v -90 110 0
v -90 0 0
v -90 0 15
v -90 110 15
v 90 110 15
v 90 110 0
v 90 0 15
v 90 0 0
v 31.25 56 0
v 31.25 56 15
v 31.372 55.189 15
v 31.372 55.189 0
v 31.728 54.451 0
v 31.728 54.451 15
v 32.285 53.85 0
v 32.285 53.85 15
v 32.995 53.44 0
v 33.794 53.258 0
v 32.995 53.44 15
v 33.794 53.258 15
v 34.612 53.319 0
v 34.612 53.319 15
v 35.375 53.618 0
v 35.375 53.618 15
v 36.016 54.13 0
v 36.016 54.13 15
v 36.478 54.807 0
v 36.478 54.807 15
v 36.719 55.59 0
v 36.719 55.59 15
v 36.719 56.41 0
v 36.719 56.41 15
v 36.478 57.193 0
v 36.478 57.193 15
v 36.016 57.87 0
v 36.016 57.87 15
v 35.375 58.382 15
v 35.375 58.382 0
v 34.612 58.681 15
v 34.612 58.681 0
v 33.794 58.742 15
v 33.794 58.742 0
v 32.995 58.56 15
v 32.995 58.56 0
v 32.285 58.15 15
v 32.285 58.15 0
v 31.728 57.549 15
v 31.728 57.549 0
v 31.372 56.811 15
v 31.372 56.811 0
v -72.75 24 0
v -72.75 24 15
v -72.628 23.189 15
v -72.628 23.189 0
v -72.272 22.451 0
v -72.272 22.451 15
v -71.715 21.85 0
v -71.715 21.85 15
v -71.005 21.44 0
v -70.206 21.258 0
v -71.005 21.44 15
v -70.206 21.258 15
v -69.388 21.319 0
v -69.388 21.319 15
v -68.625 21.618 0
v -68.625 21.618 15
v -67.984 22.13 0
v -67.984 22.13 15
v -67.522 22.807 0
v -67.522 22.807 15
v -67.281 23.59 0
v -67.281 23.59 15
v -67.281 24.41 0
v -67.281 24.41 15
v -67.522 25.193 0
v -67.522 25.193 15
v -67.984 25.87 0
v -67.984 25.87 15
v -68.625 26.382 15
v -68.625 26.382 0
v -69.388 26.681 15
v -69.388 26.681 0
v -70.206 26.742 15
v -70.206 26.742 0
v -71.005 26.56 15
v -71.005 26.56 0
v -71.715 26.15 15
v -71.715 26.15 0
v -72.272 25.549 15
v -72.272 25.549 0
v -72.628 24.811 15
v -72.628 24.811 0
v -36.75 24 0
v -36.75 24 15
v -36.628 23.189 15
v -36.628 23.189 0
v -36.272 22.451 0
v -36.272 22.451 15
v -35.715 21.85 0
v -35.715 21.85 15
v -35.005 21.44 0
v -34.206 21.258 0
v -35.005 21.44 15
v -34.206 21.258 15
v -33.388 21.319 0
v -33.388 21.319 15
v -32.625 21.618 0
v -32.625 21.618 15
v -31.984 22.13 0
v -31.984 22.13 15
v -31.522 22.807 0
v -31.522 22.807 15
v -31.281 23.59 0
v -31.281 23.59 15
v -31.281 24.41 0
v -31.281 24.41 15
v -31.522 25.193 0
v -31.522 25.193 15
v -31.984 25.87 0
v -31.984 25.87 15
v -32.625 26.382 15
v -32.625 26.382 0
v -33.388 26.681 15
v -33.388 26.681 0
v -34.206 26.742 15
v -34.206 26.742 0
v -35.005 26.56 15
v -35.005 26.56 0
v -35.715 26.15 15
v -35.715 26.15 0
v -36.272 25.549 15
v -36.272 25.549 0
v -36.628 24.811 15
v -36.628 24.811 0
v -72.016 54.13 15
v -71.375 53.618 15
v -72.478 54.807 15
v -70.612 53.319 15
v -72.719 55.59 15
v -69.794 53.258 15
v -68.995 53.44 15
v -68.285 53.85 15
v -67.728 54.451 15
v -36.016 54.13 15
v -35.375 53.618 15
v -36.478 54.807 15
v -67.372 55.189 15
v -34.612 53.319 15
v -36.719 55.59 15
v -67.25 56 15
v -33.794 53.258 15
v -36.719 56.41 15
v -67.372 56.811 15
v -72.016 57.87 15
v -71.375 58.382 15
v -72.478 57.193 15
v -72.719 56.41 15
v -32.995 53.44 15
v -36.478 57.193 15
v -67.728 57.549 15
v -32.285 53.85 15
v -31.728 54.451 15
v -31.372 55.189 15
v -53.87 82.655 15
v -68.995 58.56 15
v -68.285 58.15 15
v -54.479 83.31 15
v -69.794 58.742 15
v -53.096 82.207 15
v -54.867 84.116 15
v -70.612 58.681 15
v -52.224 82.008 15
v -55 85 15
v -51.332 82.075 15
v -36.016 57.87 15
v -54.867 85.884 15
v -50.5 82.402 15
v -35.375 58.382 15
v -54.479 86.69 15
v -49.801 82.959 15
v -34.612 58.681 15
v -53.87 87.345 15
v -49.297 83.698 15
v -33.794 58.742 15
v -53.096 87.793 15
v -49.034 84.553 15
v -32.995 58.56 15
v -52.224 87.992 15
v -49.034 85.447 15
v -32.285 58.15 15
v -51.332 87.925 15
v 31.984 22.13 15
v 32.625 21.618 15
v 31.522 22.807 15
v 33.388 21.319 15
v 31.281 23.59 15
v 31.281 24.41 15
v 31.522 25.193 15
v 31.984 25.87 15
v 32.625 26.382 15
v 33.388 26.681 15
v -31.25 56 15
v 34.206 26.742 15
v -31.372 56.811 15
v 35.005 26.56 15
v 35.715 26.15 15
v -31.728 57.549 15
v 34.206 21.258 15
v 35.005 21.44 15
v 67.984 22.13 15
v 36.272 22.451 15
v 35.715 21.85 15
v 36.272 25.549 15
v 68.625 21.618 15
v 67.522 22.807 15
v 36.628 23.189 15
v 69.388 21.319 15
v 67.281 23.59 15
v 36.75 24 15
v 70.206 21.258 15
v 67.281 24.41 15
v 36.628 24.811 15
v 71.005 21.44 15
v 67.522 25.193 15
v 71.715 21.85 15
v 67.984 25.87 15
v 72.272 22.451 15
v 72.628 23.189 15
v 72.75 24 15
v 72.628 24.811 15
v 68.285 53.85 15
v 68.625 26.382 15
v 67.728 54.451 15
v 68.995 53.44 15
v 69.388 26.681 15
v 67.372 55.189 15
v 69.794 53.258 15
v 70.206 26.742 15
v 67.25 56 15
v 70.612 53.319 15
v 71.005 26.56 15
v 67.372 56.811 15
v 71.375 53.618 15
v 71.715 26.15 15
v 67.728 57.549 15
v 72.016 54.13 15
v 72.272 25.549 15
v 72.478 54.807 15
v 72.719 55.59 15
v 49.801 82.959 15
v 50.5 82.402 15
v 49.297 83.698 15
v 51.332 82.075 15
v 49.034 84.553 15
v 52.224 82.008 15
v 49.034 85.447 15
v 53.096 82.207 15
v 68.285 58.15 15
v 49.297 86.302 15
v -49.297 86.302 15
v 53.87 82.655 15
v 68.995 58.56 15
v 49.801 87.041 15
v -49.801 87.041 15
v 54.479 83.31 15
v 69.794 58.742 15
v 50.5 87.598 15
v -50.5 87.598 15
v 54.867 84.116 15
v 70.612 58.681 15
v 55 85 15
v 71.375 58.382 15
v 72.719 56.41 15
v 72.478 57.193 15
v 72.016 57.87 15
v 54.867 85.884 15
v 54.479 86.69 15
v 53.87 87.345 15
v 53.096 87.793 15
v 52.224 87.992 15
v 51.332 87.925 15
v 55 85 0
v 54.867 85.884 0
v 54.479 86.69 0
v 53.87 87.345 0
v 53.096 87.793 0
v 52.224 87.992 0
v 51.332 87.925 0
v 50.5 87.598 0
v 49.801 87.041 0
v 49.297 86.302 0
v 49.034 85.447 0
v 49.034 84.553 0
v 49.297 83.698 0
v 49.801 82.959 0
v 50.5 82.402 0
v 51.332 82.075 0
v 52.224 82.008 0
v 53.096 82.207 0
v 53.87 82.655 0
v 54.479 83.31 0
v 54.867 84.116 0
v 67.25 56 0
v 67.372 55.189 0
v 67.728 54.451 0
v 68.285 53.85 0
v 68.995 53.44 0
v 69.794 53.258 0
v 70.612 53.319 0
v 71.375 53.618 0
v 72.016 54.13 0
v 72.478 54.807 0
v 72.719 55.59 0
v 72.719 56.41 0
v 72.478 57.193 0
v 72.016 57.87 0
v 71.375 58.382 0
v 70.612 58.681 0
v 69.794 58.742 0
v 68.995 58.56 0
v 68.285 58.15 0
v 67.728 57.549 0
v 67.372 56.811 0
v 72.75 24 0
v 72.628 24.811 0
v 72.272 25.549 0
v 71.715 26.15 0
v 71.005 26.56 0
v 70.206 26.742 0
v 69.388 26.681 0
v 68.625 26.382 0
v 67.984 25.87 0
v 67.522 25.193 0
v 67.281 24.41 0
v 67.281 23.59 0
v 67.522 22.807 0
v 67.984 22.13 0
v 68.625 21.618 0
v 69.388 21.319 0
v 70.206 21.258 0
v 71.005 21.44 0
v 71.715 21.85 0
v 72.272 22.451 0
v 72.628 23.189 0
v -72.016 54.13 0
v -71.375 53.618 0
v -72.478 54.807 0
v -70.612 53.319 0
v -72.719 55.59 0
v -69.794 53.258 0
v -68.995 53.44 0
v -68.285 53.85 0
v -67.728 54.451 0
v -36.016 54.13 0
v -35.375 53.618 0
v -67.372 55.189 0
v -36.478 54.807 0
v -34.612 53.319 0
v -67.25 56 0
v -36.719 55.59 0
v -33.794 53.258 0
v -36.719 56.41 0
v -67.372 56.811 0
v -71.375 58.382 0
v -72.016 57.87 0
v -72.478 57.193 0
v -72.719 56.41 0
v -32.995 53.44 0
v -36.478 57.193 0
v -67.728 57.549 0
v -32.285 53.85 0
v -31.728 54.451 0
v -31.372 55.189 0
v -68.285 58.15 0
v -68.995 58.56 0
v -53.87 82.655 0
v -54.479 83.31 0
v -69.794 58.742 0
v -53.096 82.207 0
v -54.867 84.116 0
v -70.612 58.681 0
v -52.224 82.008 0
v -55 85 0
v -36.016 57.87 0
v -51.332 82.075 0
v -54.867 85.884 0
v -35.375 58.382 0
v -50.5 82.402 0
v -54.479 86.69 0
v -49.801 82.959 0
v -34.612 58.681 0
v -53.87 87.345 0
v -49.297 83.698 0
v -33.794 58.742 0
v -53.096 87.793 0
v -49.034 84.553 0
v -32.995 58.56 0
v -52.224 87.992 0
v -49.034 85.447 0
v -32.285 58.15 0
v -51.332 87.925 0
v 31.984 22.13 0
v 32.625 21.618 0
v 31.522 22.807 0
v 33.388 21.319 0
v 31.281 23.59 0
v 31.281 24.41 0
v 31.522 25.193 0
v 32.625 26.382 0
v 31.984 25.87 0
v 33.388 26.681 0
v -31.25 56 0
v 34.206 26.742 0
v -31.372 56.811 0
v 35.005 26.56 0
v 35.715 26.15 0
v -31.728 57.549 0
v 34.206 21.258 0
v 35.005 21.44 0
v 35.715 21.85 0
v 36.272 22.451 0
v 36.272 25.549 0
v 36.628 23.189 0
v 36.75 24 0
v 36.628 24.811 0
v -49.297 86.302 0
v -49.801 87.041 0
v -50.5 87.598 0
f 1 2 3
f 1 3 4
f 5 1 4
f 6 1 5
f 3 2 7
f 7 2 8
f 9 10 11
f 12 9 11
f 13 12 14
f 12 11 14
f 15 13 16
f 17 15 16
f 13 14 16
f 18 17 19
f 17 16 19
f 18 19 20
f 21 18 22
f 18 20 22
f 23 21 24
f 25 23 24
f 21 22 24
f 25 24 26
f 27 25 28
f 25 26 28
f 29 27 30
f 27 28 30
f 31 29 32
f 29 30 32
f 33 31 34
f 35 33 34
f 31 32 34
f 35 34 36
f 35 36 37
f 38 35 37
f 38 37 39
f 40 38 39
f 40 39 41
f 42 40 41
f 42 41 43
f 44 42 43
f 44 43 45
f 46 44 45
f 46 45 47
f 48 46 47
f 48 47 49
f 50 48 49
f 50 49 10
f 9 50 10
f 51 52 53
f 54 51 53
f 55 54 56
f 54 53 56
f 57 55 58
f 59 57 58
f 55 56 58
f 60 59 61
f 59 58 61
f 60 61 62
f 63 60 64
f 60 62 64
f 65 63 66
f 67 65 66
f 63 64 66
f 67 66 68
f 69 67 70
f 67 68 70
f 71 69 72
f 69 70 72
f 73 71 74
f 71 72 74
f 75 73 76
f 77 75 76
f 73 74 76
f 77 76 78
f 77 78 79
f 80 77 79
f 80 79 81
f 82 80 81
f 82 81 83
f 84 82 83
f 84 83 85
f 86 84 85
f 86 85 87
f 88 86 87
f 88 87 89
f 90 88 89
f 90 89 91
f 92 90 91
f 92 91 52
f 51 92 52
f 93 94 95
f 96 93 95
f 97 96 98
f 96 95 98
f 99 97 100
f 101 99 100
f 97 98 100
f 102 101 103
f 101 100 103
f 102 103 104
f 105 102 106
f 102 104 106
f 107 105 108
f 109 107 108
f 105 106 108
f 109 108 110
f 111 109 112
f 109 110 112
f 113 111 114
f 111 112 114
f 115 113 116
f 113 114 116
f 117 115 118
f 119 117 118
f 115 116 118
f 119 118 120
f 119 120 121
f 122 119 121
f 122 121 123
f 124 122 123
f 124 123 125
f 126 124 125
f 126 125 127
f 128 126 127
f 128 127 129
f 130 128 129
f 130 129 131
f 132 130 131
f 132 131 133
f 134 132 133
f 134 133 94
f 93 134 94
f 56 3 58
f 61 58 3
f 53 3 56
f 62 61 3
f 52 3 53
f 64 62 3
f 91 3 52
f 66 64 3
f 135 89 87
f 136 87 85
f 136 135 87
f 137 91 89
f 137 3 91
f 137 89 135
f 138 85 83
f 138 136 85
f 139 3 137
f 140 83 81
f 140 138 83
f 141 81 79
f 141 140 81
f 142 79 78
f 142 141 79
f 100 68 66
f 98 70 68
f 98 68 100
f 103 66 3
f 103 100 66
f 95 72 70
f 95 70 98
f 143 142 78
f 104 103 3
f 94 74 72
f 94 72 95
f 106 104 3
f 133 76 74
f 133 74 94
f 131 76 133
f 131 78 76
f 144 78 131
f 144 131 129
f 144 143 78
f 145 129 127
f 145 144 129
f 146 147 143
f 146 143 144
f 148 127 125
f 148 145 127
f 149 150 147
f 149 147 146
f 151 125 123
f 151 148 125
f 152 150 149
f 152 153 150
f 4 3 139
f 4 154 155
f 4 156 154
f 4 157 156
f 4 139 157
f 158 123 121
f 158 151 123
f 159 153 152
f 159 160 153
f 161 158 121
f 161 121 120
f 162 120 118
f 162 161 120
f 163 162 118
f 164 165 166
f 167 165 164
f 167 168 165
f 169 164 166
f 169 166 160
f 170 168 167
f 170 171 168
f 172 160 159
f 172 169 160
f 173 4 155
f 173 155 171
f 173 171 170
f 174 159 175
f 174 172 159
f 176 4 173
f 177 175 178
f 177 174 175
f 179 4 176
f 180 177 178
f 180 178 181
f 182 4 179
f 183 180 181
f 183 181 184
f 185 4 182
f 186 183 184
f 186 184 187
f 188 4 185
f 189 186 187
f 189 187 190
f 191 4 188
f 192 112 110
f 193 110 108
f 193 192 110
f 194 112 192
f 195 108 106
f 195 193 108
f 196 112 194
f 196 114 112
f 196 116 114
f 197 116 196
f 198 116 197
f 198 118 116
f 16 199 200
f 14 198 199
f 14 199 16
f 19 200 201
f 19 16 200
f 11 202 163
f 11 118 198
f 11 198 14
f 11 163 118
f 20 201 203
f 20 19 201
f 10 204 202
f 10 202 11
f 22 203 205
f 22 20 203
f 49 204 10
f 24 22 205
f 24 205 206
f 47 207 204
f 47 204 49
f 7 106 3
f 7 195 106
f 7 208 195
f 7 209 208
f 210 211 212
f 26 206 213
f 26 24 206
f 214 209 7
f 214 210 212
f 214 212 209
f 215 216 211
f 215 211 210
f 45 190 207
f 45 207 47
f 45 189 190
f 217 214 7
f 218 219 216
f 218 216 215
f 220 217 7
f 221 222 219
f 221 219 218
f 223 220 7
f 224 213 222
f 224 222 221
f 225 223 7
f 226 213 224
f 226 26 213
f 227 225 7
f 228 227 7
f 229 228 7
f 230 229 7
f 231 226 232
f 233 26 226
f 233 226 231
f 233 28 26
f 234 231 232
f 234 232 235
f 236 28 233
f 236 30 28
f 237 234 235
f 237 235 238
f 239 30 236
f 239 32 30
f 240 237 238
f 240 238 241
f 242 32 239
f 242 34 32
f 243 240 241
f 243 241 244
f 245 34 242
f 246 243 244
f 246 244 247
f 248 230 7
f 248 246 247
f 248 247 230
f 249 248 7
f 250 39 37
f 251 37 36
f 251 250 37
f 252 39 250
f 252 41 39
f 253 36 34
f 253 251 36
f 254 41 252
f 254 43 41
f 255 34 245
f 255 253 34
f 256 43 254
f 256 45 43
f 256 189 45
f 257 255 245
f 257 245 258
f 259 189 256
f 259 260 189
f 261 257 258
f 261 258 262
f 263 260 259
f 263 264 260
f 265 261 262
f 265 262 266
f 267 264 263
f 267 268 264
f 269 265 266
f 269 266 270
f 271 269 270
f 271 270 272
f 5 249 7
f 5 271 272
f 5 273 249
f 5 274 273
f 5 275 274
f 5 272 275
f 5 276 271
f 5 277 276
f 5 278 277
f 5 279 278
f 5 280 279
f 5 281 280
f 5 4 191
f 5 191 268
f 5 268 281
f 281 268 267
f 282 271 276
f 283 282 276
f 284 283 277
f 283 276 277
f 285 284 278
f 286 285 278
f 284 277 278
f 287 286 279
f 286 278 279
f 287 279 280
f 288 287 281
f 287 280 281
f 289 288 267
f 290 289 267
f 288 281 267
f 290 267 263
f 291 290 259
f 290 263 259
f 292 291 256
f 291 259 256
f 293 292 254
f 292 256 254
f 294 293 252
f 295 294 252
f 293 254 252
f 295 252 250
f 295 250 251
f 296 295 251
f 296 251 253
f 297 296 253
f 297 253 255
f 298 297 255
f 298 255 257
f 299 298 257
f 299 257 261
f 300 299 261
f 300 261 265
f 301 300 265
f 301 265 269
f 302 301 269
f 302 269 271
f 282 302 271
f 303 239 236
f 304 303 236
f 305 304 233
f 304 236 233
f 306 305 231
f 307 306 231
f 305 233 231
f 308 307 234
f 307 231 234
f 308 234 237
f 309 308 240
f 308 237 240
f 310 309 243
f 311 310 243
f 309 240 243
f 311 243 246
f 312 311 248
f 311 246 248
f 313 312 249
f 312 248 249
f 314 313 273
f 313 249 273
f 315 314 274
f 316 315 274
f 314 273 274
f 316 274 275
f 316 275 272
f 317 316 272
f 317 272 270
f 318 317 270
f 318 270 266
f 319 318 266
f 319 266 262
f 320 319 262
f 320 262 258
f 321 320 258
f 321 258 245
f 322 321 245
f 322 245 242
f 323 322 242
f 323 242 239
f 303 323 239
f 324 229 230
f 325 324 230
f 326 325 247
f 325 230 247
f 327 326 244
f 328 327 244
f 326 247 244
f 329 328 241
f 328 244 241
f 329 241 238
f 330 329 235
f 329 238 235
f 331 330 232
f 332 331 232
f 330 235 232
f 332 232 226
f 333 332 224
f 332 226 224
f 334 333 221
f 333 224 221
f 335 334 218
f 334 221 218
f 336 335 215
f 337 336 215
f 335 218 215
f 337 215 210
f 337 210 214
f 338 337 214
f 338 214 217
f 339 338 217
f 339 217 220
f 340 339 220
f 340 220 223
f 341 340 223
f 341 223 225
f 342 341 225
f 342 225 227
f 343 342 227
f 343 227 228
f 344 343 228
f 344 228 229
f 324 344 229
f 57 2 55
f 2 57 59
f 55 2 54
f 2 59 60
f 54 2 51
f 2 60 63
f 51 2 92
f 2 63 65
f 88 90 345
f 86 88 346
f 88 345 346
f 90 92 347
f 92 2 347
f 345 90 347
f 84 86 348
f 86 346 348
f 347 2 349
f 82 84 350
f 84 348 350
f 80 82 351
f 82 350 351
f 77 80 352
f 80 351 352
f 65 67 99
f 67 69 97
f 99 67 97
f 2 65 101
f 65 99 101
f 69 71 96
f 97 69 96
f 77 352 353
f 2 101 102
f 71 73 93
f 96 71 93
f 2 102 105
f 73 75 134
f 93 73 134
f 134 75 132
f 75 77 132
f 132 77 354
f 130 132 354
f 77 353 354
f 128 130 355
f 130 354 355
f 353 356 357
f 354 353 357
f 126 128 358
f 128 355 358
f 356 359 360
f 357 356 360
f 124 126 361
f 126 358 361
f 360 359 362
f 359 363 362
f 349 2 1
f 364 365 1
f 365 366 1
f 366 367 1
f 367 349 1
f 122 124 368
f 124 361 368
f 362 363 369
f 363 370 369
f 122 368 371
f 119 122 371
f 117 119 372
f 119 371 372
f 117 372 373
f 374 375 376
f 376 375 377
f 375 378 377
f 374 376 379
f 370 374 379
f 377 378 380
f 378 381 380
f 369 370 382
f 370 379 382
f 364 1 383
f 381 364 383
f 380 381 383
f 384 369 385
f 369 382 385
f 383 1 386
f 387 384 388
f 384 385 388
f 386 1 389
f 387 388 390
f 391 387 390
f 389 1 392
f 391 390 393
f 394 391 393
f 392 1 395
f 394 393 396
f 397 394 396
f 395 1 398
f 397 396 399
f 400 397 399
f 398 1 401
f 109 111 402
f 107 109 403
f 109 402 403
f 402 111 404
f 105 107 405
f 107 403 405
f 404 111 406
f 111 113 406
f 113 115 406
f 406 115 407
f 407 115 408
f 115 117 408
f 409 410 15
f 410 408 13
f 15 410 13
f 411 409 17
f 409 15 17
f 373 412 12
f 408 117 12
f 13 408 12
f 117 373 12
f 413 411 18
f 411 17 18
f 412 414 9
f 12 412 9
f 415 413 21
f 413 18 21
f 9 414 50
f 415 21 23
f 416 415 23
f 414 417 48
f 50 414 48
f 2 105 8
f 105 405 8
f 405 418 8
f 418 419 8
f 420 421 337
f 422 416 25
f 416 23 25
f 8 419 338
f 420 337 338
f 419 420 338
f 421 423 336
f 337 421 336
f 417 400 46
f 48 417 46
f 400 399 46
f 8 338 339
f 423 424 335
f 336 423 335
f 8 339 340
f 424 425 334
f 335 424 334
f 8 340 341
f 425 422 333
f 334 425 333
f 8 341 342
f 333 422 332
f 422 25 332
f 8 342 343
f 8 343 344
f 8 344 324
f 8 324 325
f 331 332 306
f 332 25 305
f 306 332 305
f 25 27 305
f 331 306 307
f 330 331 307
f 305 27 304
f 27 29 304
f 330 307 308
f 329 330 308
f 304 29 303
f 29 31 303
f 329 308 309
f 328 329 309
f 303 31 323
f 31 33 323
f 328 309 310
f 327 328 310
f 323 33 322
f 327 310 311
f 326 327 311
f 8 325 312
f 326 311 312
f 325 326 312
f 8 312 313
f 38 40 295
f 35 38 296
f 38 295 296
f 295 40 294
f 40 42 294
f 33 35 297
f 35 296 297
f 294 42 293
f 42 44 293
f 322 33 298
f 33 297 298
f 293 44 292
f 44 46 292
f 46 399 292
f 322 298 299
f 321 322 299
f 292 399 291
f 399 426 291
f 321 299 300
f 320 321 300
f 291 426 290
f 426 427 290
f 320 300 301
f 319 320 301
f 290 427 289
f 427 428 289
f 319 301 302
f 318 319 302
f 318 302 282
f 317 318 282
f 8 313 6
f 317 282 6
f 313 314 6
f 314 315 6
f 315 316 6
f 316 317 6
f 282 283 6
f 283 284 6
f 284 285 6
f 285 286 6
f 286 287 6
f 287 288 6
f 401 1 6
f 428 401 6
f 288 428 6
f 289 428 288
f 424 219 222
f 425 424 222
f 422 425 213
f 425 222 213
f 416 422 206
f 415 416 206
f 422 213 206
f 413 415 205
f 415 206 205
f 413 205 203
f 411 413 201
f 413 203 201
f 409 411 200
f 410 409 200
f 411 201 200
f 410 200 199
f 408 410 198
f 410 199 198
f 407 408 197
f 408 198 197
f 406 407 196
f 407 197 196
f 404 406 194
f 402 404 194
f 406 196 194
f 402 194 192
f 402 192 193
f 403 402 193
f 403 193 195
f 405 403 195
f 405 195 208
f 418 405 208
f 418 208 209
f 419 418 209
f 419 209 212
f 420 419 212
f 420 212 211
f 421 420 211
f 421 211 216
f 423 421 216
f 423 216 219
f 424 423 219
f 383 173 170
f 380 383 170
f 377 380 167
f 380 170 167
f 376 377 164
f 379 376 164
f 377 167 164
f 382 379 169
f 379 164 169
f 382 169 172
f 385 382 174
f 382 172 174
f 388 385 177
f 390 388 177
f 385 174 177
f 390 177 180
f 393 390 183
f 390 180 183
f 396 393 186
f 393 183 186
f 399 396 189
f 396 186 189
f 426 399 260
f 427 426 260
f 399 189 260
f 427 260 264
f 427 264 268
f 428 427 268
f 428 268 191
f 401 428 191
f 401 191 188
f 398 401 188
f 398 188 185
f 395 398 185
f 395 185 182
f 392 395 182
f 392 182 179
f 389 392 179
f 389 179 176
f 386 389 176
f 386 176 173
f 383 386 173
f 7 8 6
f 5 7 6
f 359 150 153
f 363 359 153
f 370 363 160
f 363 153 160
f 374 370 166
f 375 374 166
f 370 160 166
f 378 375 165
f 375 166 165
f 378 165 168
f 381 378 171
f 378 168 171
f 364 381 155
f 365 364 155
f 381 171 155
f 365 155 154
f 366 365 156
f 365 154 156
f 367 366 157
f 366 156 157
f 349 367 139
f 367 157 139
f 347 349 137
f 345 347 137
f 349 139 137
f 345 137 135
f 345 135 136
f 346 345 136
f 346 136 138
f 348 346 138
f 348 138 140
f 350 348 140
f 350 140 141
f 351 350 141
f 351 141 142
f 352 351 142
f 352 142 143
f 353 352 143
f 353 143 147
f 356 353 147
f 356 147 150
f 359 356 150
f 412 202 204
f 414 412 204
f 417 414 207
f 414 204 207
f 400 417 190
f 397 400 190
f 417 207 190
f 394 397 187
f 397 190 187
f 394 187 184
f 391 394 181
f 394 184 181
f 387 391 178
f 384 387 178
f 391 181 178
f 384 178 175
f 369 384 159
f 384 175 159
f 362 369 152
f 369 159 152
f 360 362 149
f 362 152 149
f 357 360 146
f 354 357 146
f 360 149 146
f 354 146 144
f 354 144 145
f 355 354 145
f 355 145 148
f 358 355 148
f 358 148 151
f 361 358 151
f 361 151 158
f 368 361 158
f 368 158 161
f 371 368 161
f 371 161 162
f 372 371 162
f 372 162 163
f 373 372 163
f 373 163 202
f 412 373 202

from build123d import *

# Parameters (mm, degrees)
SKIZZE1_W                       = 180
SKIZZE1_H                       = 110
AUFSATZ_LINEAR_AUSTRAGEN1_DEPTH = 15
SKIZZE2_R                       = 2.75
SCHNITT_LINEAR_AUSTRAGEN1_DEPTH = 40
SKIZZE3_R                       = 3
SCHNITT_LINEAR_AUSTRAGEN2_DEPTH = 40


with BuildPart() as part:
    # Skizze1 → Aufsatz-Linear austragen1 (new body)
    with BuildSketch(Plane.XY):
        with Locations((0, 55)):
            Rectangle(SKIZZE1_W, SKIZZE1_H)
    extrude(amount=AUFSATZ_LINEAR_AUSTRAGEN1_DEPTH)

    # Skizze2 → Schnitt-Linear austragen1 (cut)
    with BuildSketch(Plane.XY.offset(15)):
        with Locations((34, 24)):
            Circle(SKIZZE2_R)
        with Locations((70, 24)):
            Circle(SKIZZE2_R)
        with Locations(Location((70, 56, 0), (0, 0, 180))):
            Circle(SKIZZE2_R)
        with Locations(Location((34, 56, 0), (0, 0, 180))):
            Circle(SKIZZE2_R)
        with Locations(Location((-34, 24, 0), (0, 0, 180))):
            Circle(SKIZZE2_R)
        with Locations(Location((-70, 24, 0), (0, 0, 180))):
            Circle(SKIZZE2_R)
        with Locations((-70, 56)):
            Circle(SKIZZE2_R)
        with Locations((-34, 56)):
            Circle(SKIZZE2_R)
    extrude(amount=-SCHNITT_LINEAR_AUSTRAGEN1_DEPTH, mode=Mode.SUBTRACT)

    # Skizze3 → Schnitt-Linear austragen2 (cut)
    with BuildSketch(Plane.XY.offset(15)):
        with Locations((52, 85)):
            Circle(SKIZZE3_R)
        with Locations(Location((-52, 85, 0), (0, 0, 180))):
            Circle(SKIZZE3_R)
    extrude(amount=-SCHNITT_LINEAR_AUSTRAGEN2_DEPTH, mode=Mode.SUBTRACT)


solid = part.part
